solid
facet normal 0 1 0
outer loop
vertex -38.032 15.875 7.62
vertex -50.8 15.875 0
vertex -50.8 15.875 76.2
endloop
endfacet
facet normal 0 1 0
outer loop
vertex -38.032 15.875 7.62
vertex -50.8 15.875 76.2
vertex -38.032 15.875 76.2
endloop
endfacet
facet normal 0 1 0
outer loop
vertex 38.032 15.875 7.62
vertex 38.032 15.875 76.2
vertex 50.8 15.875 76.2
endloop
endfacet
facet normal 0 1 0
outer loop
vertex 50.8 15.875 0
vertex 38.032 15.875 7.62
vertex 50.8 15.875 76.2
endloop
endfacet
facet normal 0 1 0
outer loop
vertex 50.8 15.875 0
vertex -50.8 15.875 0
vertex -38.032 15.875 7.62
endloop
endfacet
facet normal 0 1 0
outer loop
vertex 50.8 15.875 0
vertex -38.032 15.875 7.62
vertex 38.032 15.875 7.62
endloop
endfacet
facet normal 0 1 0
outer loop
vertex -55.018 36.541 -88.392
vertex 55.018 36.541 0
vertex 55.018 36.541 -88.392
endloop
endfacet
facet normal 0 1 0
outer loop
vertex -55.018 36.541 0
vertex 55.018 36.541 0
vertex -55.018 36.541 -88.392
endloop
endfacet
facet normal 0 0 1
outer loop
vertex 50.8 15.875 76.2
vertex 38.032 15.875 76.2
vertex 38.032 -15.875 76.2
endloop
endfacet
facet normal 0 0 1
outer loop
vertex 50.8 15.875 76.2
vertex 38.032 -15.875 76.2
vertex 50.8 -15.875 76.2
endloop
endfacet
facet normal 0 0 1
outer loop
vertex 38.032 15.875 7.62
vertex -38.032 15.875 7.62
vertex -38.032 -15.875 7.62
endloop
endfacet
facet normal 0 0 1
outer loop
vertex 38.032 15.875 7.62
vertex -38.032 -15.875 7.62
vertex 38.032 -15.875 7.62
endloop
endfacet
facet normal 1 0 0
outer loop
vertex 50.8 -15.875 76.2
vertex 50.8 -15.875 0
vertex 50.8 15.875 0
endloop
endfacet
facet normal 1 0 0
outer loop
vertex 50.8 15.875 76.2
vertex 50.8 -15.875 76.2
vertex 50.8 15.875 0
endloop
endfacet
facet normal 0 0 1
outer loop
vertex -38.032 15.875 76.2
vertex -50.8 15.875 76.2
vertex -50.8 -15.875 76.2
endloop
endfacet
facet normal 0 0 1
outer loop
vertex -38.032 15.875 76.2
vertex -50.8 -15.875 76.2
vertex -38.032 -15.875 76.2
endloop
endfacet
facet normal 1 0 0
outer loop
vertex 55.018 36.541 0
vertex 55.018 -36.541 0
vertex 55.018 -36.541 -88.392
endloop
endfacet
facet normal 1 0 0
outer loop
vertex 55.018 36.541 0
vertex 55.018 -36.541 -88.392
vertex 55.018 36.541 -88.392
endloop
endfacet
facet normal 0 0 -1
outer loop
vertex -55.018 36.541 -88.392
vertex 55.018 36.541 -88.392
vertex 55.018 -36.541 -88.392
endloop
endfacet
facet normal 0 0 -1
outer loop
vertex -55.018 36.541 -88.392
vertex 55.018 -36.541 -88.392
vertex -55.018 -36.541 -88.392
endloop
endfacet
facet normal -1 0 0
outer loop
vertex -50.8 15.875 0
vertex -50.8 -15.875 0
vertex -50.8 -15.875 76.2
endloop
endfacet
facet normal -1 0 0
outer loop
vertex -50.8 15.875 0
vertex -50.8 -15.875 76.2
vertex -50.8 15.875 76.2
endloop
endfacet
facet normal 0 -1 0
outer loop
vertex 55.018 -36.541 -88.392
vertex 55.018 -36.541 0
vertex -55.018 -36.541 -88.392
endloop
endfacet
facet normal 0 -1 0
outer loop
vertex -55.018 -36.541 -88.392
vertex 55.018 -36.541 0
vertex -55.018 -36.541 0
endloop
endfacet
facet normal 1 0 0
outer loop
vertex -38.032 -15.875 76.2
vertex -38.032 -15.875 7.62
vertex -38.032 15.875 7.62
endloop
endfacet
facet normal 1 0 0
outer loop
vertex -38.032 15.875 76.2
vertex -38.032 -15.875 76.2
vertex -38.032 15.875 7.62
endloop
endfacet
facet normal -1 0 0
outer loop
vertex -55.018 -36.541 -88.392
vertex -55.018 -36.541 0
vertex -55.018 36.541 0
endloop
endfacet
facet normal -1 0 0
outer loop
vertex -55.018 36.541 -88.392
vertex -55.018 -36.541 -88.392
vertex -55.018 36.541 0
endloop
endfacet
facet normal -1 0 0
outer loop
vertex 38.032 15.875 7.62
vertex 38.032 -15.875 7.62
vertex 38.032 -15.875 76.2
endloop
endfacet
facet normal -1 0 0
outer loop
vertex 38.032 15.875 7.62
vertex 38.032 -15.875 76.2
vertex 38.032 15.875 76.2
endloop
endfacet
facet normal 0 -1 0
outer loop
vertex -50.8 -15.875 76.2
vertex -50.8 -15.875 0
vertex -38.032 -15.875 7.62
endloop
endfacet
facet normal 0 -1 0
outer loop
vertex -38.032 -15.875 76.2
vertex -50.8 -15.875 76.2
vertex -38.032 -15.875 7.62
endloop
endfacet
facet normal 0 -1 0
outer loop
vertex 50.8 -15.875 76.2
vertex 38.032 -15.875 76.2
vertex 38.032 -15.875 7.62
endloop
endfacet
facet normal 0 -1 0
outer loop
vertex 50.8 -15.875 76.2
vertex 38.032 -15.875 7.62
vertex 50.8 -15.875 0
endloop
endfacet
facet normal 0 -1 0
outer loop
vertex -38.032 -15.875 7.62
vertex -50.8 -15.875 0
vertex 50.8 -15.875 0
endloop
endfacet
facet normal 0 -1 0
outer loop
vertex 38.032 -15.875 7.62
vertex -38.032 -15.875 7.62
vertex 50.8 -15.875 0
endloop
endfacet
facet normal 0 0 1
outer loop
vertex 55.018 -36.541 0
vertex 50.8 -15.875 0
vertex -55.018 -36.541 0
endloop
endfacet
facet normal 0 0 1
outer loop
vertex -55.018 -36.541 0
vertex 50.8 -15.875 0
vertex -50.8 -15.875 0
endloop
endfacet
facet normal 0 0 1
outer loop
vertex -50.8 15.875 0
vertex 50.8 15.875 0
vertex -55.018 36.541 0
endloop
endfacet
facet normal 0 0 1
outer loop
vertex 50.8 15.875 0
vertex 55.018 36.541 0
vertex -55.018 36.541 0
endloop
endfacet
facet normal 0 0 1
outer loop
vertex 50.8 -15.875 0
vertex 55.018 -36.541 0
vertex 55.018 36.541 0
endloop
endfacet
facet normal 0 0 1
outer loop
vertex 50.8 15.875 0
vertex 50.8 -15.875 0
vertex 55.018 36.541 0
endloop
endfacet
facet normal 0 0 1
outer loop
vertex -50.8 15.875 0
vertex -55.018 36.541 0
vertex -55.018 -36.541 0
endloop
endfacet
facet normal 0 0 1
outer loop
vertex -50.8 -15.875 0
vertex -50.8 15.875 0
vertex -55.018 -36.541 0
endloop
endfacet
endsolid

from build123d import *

# Parameters (mm, degrees)
SKETCH1_W           = 101.6
SKETCH1_H           = 31.75
BOSS_EXTRUDE1_DEPTH = 76.2
SKETCH2_W           = 76.064070538
SKETCH2_H           = 31.75
CUT_EXTRUDE1_DEPTH  = 68.58
SKETCH4_W           = 110.036041042
SKETCH4_H           = 73.081165812
BOSS_EXTRUDE2_DEPTH = 88.392


with BuildPart() as part:
    # Sketch1 → Boss-Extrude1 (new body)
    with BuildSketch(Plane.XY):
        Rectangle(SKETCH1_W, SKETCH1_H)
    extrude(amount=BOSS_EXTRUDE1_DEPTH)

    # Sketch2 → Cut-Extrude1 (cut)
    with BuildSketch(Plane.XY.offset(76.2)):
        Rectangle(SKETCH2_W, SKETCH2_H)
    extrude(amount=-CUT_EXTRUDE1_DEPTH, mode=Mode.SUBTRACT)

    # Sketch4 → Boss-Extrude2 (add)
    with BuildSketch(Plane(origin=(0, 0, 0), x_dir=(-1, 0, 0), z_dir=(0, 0, -1))):
        Rectangle(SKETCH4_W, SKETCH4_H)
    extrude(amount=BOSS_EXTRUDE2_DEPTH)


solid = part.part
